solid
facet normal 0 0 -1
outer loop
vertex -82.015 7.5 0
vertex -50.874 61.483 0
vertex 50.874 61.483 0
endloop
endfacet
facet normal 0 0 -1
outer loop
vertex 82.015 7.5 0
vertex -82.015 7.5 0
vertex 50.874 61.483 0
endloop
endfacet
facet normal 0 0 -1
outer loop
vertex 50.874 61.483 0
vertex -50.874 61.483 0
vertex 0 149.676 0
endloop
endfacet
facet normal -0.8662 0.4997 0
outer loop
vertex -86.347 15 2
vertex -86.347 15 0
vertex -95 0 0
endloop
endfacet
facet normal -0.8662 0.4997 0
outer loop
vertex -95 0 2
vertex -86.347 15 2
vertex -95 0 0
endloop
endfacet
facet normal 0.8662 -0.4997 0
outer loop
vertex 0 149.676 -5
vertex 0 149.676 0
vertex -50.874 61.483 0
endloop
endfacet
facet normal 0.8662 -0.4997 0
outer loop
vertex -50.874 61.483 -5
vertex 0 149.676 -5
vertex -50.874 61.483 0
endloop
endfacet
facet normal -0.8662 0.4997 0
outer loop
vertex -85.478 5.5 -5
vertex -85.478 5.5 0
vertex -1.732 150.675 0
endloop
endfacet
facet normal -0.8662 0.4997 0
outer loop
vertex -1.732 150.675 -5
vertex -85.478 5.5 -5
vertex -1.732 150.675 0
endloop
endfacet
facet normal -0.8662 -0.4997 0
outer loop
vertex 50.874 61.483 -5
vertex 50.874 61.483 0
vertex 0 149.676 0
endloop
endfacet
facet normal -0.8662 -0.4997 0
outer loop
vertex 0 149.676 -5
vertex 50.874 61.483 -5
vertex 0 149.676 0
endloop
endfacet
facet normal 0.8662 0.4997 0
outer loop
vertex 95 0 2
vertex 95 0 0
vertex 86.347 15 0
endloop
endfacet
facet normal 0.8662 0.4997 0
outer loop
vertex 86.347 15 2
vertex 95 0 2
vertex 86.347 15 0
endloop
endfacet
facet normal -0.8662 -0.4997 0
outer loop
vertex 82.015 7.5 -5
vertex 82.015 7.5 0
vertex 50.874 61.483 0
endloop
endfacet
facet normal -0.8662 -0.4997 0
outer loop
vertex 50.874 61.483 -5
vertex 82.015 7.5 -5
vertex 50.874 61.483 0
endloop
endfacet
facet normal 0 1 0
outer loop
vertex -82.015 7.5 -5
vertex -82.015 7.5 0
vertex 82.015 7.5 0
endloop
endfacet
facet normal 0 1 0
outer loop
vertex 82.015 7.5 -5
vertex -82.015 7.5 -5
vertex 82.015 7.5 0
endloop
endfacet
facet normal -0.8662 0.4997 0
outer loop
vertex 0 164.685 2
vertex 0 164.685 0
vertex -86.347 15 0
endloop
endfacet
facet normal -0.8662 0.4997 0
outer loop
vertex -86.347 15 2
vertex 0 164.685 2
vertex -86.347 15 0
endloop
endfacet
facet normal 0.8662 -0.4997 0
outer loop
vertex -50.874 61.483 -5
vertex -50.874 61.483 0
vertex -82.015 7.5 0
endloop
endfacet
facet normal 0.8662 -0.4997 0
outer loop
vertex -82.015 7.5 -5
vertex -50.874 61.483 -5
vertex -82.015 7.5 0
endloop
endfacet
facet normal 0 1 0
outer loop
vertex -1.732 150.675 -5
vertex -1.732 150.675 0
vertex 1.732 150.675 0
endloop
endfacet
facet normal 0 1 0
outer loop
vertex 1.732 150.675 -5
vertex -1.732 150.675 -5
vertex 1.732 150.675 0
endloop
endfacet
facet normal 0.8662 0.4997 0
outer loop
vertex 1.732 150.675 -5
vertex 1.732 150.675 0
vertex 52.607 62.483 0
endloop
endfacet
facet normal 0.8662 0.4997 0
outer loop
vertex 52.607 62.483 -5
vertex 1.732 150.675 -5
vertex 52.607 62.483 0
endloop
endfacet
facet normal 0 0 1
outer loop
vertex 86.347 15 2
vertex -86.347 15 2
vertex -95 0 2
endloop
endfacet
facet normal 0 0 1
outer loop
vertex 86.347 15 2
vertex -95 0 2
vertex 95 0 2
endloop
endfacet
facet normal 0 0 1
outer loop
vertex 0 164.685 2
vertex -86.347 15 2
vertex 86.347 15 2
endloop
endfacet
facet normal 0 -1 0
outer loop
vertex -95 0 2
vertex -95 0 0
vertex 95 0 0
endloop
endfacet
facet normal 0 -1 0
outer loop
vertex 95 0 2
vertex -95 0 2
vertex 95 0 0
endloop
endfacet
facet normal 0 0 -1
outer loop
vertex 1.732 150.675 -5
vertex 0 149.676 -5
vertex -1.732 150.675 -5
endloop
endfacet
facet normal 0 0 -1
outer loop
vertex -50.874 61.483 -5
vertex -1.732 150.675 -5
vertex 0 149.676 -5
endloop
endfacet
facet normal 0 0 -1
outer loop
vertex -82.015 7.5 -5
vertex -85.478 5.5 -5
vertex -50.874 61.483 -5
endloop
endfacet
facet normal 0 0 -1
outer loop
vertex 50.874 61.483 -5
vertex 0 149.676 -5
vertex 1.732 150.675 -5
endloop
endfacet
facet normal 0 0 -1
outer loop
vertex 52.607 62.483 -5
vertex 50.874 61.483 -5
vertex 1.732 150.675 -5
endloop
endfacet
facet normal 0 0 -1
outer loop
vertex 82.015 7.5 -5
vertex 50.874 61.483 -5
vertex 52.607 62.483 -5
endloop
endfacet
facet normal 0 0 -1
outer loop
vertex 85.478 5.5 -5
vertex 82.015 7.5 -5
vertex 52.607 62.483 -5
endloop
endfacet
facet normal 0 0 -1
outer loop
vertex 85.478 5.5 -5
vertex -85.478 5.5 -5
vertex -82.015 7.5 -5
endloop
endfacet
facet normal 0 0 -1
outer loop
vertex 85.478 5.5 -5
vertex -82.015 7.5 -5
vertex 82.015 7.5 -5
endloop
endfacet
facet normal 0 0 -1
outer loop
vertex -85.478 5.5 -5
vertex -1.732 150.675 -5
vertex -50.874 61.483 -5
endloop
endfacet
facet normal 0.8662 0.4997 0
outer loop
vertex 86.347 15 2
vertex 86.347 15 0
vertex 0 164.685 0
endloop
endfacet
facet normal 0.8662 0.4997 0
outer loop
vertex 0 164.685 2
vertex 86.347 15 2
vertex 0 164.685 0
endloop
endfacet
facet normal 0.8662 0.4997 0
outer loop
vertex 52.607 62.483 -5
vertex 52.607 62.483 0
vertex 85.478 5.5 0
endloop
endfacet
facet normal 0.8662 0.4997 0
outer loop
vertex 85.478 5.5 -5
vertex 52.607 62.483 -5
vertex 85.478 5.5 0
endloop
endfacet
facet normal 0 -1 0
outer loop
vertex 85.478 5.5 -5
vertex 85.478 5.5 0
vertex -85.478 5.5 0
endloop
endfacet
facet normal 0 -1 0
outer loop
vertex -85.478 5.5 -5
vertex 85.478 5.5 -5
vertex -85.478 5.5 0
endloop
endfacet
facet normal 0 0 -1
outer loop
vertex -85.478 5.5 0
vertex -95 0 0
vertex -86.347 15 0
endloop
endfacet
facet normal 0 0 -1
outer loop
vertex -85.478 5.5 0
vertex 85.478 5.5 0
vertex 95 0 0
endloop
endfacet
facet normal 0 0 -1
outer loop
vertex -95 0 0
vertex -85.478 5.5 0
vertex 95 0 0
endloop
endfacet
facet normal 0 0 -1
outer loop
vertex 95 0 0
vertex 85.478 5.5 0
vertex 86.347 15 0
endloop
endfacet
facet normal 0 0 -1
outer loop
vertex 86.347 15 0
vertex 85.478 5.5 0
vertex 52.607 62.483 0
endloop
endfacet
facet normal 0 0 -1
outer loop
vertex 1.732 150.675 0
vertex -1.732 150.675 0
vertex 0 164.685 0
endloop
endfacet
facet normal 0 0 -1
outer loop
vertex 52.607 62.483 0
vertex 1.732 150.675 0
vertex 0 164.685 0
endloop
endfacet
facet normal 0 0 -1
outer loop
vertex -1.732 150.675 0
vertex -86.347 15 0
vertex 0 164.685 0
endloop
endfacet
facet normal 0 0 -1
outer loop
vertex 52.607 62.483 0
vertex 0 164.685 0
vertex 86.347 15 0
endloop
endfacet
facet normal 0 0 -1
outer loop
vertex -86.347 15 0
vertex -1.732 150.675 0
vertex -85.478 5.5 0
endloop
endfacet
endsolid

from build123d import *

# Parameters (mm, degrees)
F1_DEPTH = 2
F3_DEPTH = 5


with BuildPart() as f1:
    # F0 (on Top) → F1 (new body)
    with BuildSketch(Plane.XY):
        Polygon((0, 164.685234), (-86.34713, 15), (-69.030312, 15), (-37.203411, 70.172849), (0, 134.666033), (37.203411, 70.172849), (69.030312, 15), (86.34713, 15), align=None)
        Polygon((-89.227728, 0), (0, 0), (89.227728, 0), (86.343437, 5), (92.11571, 5), (86.34713, 15), (69.030312, 15), (0, 15), (-69.030312, 15), (-86.34713, 15), (-95, 0), align=None)
        Polygon((86.343437, 5), (89.227728, 0), (95, 0), (92.11571, 5), align=None)
        Polygon((-37.203411, 70.172849), (-69.030312, 15), (0, 15), (69.030312, 15), (37.203411, 70.172849), (0, 134.666033), align=None)
    extrude(amount=F1_DEPTH)

    # F2 (on face) → F3 (join)
    with BuildSketch(Plane(origin=(0, 0, 0), x_dir=(1, 0, 0), z_dir=(0, 0, -1))):
        Polygon((1.73242, -150.674994), (52.60681, -62.482775), (50.87439, -61.483415), (0, -149.675634), (-50.87439, -61.483415), (-82.015156, -7.5), (-83.168872, -5.5), (-85.477781, -5.5), (-1.73242, -150.674994), align=None)
        Polygon((0, -7.5), (82.015156, -7.5), (83.168872, -5.5), (-12.322525, -5.5), (-83.168872, -5.5), (-82.015156, -7.5), align=None)
        Polygon((50.87439, -61.483415), (52.60681, -62.482775), (85.477781, -5.5), (83.168872, -5.5), (82.015156, -7.5), align=None)
    extrude(amount=F3_DEPTH)


solid = f1.part
